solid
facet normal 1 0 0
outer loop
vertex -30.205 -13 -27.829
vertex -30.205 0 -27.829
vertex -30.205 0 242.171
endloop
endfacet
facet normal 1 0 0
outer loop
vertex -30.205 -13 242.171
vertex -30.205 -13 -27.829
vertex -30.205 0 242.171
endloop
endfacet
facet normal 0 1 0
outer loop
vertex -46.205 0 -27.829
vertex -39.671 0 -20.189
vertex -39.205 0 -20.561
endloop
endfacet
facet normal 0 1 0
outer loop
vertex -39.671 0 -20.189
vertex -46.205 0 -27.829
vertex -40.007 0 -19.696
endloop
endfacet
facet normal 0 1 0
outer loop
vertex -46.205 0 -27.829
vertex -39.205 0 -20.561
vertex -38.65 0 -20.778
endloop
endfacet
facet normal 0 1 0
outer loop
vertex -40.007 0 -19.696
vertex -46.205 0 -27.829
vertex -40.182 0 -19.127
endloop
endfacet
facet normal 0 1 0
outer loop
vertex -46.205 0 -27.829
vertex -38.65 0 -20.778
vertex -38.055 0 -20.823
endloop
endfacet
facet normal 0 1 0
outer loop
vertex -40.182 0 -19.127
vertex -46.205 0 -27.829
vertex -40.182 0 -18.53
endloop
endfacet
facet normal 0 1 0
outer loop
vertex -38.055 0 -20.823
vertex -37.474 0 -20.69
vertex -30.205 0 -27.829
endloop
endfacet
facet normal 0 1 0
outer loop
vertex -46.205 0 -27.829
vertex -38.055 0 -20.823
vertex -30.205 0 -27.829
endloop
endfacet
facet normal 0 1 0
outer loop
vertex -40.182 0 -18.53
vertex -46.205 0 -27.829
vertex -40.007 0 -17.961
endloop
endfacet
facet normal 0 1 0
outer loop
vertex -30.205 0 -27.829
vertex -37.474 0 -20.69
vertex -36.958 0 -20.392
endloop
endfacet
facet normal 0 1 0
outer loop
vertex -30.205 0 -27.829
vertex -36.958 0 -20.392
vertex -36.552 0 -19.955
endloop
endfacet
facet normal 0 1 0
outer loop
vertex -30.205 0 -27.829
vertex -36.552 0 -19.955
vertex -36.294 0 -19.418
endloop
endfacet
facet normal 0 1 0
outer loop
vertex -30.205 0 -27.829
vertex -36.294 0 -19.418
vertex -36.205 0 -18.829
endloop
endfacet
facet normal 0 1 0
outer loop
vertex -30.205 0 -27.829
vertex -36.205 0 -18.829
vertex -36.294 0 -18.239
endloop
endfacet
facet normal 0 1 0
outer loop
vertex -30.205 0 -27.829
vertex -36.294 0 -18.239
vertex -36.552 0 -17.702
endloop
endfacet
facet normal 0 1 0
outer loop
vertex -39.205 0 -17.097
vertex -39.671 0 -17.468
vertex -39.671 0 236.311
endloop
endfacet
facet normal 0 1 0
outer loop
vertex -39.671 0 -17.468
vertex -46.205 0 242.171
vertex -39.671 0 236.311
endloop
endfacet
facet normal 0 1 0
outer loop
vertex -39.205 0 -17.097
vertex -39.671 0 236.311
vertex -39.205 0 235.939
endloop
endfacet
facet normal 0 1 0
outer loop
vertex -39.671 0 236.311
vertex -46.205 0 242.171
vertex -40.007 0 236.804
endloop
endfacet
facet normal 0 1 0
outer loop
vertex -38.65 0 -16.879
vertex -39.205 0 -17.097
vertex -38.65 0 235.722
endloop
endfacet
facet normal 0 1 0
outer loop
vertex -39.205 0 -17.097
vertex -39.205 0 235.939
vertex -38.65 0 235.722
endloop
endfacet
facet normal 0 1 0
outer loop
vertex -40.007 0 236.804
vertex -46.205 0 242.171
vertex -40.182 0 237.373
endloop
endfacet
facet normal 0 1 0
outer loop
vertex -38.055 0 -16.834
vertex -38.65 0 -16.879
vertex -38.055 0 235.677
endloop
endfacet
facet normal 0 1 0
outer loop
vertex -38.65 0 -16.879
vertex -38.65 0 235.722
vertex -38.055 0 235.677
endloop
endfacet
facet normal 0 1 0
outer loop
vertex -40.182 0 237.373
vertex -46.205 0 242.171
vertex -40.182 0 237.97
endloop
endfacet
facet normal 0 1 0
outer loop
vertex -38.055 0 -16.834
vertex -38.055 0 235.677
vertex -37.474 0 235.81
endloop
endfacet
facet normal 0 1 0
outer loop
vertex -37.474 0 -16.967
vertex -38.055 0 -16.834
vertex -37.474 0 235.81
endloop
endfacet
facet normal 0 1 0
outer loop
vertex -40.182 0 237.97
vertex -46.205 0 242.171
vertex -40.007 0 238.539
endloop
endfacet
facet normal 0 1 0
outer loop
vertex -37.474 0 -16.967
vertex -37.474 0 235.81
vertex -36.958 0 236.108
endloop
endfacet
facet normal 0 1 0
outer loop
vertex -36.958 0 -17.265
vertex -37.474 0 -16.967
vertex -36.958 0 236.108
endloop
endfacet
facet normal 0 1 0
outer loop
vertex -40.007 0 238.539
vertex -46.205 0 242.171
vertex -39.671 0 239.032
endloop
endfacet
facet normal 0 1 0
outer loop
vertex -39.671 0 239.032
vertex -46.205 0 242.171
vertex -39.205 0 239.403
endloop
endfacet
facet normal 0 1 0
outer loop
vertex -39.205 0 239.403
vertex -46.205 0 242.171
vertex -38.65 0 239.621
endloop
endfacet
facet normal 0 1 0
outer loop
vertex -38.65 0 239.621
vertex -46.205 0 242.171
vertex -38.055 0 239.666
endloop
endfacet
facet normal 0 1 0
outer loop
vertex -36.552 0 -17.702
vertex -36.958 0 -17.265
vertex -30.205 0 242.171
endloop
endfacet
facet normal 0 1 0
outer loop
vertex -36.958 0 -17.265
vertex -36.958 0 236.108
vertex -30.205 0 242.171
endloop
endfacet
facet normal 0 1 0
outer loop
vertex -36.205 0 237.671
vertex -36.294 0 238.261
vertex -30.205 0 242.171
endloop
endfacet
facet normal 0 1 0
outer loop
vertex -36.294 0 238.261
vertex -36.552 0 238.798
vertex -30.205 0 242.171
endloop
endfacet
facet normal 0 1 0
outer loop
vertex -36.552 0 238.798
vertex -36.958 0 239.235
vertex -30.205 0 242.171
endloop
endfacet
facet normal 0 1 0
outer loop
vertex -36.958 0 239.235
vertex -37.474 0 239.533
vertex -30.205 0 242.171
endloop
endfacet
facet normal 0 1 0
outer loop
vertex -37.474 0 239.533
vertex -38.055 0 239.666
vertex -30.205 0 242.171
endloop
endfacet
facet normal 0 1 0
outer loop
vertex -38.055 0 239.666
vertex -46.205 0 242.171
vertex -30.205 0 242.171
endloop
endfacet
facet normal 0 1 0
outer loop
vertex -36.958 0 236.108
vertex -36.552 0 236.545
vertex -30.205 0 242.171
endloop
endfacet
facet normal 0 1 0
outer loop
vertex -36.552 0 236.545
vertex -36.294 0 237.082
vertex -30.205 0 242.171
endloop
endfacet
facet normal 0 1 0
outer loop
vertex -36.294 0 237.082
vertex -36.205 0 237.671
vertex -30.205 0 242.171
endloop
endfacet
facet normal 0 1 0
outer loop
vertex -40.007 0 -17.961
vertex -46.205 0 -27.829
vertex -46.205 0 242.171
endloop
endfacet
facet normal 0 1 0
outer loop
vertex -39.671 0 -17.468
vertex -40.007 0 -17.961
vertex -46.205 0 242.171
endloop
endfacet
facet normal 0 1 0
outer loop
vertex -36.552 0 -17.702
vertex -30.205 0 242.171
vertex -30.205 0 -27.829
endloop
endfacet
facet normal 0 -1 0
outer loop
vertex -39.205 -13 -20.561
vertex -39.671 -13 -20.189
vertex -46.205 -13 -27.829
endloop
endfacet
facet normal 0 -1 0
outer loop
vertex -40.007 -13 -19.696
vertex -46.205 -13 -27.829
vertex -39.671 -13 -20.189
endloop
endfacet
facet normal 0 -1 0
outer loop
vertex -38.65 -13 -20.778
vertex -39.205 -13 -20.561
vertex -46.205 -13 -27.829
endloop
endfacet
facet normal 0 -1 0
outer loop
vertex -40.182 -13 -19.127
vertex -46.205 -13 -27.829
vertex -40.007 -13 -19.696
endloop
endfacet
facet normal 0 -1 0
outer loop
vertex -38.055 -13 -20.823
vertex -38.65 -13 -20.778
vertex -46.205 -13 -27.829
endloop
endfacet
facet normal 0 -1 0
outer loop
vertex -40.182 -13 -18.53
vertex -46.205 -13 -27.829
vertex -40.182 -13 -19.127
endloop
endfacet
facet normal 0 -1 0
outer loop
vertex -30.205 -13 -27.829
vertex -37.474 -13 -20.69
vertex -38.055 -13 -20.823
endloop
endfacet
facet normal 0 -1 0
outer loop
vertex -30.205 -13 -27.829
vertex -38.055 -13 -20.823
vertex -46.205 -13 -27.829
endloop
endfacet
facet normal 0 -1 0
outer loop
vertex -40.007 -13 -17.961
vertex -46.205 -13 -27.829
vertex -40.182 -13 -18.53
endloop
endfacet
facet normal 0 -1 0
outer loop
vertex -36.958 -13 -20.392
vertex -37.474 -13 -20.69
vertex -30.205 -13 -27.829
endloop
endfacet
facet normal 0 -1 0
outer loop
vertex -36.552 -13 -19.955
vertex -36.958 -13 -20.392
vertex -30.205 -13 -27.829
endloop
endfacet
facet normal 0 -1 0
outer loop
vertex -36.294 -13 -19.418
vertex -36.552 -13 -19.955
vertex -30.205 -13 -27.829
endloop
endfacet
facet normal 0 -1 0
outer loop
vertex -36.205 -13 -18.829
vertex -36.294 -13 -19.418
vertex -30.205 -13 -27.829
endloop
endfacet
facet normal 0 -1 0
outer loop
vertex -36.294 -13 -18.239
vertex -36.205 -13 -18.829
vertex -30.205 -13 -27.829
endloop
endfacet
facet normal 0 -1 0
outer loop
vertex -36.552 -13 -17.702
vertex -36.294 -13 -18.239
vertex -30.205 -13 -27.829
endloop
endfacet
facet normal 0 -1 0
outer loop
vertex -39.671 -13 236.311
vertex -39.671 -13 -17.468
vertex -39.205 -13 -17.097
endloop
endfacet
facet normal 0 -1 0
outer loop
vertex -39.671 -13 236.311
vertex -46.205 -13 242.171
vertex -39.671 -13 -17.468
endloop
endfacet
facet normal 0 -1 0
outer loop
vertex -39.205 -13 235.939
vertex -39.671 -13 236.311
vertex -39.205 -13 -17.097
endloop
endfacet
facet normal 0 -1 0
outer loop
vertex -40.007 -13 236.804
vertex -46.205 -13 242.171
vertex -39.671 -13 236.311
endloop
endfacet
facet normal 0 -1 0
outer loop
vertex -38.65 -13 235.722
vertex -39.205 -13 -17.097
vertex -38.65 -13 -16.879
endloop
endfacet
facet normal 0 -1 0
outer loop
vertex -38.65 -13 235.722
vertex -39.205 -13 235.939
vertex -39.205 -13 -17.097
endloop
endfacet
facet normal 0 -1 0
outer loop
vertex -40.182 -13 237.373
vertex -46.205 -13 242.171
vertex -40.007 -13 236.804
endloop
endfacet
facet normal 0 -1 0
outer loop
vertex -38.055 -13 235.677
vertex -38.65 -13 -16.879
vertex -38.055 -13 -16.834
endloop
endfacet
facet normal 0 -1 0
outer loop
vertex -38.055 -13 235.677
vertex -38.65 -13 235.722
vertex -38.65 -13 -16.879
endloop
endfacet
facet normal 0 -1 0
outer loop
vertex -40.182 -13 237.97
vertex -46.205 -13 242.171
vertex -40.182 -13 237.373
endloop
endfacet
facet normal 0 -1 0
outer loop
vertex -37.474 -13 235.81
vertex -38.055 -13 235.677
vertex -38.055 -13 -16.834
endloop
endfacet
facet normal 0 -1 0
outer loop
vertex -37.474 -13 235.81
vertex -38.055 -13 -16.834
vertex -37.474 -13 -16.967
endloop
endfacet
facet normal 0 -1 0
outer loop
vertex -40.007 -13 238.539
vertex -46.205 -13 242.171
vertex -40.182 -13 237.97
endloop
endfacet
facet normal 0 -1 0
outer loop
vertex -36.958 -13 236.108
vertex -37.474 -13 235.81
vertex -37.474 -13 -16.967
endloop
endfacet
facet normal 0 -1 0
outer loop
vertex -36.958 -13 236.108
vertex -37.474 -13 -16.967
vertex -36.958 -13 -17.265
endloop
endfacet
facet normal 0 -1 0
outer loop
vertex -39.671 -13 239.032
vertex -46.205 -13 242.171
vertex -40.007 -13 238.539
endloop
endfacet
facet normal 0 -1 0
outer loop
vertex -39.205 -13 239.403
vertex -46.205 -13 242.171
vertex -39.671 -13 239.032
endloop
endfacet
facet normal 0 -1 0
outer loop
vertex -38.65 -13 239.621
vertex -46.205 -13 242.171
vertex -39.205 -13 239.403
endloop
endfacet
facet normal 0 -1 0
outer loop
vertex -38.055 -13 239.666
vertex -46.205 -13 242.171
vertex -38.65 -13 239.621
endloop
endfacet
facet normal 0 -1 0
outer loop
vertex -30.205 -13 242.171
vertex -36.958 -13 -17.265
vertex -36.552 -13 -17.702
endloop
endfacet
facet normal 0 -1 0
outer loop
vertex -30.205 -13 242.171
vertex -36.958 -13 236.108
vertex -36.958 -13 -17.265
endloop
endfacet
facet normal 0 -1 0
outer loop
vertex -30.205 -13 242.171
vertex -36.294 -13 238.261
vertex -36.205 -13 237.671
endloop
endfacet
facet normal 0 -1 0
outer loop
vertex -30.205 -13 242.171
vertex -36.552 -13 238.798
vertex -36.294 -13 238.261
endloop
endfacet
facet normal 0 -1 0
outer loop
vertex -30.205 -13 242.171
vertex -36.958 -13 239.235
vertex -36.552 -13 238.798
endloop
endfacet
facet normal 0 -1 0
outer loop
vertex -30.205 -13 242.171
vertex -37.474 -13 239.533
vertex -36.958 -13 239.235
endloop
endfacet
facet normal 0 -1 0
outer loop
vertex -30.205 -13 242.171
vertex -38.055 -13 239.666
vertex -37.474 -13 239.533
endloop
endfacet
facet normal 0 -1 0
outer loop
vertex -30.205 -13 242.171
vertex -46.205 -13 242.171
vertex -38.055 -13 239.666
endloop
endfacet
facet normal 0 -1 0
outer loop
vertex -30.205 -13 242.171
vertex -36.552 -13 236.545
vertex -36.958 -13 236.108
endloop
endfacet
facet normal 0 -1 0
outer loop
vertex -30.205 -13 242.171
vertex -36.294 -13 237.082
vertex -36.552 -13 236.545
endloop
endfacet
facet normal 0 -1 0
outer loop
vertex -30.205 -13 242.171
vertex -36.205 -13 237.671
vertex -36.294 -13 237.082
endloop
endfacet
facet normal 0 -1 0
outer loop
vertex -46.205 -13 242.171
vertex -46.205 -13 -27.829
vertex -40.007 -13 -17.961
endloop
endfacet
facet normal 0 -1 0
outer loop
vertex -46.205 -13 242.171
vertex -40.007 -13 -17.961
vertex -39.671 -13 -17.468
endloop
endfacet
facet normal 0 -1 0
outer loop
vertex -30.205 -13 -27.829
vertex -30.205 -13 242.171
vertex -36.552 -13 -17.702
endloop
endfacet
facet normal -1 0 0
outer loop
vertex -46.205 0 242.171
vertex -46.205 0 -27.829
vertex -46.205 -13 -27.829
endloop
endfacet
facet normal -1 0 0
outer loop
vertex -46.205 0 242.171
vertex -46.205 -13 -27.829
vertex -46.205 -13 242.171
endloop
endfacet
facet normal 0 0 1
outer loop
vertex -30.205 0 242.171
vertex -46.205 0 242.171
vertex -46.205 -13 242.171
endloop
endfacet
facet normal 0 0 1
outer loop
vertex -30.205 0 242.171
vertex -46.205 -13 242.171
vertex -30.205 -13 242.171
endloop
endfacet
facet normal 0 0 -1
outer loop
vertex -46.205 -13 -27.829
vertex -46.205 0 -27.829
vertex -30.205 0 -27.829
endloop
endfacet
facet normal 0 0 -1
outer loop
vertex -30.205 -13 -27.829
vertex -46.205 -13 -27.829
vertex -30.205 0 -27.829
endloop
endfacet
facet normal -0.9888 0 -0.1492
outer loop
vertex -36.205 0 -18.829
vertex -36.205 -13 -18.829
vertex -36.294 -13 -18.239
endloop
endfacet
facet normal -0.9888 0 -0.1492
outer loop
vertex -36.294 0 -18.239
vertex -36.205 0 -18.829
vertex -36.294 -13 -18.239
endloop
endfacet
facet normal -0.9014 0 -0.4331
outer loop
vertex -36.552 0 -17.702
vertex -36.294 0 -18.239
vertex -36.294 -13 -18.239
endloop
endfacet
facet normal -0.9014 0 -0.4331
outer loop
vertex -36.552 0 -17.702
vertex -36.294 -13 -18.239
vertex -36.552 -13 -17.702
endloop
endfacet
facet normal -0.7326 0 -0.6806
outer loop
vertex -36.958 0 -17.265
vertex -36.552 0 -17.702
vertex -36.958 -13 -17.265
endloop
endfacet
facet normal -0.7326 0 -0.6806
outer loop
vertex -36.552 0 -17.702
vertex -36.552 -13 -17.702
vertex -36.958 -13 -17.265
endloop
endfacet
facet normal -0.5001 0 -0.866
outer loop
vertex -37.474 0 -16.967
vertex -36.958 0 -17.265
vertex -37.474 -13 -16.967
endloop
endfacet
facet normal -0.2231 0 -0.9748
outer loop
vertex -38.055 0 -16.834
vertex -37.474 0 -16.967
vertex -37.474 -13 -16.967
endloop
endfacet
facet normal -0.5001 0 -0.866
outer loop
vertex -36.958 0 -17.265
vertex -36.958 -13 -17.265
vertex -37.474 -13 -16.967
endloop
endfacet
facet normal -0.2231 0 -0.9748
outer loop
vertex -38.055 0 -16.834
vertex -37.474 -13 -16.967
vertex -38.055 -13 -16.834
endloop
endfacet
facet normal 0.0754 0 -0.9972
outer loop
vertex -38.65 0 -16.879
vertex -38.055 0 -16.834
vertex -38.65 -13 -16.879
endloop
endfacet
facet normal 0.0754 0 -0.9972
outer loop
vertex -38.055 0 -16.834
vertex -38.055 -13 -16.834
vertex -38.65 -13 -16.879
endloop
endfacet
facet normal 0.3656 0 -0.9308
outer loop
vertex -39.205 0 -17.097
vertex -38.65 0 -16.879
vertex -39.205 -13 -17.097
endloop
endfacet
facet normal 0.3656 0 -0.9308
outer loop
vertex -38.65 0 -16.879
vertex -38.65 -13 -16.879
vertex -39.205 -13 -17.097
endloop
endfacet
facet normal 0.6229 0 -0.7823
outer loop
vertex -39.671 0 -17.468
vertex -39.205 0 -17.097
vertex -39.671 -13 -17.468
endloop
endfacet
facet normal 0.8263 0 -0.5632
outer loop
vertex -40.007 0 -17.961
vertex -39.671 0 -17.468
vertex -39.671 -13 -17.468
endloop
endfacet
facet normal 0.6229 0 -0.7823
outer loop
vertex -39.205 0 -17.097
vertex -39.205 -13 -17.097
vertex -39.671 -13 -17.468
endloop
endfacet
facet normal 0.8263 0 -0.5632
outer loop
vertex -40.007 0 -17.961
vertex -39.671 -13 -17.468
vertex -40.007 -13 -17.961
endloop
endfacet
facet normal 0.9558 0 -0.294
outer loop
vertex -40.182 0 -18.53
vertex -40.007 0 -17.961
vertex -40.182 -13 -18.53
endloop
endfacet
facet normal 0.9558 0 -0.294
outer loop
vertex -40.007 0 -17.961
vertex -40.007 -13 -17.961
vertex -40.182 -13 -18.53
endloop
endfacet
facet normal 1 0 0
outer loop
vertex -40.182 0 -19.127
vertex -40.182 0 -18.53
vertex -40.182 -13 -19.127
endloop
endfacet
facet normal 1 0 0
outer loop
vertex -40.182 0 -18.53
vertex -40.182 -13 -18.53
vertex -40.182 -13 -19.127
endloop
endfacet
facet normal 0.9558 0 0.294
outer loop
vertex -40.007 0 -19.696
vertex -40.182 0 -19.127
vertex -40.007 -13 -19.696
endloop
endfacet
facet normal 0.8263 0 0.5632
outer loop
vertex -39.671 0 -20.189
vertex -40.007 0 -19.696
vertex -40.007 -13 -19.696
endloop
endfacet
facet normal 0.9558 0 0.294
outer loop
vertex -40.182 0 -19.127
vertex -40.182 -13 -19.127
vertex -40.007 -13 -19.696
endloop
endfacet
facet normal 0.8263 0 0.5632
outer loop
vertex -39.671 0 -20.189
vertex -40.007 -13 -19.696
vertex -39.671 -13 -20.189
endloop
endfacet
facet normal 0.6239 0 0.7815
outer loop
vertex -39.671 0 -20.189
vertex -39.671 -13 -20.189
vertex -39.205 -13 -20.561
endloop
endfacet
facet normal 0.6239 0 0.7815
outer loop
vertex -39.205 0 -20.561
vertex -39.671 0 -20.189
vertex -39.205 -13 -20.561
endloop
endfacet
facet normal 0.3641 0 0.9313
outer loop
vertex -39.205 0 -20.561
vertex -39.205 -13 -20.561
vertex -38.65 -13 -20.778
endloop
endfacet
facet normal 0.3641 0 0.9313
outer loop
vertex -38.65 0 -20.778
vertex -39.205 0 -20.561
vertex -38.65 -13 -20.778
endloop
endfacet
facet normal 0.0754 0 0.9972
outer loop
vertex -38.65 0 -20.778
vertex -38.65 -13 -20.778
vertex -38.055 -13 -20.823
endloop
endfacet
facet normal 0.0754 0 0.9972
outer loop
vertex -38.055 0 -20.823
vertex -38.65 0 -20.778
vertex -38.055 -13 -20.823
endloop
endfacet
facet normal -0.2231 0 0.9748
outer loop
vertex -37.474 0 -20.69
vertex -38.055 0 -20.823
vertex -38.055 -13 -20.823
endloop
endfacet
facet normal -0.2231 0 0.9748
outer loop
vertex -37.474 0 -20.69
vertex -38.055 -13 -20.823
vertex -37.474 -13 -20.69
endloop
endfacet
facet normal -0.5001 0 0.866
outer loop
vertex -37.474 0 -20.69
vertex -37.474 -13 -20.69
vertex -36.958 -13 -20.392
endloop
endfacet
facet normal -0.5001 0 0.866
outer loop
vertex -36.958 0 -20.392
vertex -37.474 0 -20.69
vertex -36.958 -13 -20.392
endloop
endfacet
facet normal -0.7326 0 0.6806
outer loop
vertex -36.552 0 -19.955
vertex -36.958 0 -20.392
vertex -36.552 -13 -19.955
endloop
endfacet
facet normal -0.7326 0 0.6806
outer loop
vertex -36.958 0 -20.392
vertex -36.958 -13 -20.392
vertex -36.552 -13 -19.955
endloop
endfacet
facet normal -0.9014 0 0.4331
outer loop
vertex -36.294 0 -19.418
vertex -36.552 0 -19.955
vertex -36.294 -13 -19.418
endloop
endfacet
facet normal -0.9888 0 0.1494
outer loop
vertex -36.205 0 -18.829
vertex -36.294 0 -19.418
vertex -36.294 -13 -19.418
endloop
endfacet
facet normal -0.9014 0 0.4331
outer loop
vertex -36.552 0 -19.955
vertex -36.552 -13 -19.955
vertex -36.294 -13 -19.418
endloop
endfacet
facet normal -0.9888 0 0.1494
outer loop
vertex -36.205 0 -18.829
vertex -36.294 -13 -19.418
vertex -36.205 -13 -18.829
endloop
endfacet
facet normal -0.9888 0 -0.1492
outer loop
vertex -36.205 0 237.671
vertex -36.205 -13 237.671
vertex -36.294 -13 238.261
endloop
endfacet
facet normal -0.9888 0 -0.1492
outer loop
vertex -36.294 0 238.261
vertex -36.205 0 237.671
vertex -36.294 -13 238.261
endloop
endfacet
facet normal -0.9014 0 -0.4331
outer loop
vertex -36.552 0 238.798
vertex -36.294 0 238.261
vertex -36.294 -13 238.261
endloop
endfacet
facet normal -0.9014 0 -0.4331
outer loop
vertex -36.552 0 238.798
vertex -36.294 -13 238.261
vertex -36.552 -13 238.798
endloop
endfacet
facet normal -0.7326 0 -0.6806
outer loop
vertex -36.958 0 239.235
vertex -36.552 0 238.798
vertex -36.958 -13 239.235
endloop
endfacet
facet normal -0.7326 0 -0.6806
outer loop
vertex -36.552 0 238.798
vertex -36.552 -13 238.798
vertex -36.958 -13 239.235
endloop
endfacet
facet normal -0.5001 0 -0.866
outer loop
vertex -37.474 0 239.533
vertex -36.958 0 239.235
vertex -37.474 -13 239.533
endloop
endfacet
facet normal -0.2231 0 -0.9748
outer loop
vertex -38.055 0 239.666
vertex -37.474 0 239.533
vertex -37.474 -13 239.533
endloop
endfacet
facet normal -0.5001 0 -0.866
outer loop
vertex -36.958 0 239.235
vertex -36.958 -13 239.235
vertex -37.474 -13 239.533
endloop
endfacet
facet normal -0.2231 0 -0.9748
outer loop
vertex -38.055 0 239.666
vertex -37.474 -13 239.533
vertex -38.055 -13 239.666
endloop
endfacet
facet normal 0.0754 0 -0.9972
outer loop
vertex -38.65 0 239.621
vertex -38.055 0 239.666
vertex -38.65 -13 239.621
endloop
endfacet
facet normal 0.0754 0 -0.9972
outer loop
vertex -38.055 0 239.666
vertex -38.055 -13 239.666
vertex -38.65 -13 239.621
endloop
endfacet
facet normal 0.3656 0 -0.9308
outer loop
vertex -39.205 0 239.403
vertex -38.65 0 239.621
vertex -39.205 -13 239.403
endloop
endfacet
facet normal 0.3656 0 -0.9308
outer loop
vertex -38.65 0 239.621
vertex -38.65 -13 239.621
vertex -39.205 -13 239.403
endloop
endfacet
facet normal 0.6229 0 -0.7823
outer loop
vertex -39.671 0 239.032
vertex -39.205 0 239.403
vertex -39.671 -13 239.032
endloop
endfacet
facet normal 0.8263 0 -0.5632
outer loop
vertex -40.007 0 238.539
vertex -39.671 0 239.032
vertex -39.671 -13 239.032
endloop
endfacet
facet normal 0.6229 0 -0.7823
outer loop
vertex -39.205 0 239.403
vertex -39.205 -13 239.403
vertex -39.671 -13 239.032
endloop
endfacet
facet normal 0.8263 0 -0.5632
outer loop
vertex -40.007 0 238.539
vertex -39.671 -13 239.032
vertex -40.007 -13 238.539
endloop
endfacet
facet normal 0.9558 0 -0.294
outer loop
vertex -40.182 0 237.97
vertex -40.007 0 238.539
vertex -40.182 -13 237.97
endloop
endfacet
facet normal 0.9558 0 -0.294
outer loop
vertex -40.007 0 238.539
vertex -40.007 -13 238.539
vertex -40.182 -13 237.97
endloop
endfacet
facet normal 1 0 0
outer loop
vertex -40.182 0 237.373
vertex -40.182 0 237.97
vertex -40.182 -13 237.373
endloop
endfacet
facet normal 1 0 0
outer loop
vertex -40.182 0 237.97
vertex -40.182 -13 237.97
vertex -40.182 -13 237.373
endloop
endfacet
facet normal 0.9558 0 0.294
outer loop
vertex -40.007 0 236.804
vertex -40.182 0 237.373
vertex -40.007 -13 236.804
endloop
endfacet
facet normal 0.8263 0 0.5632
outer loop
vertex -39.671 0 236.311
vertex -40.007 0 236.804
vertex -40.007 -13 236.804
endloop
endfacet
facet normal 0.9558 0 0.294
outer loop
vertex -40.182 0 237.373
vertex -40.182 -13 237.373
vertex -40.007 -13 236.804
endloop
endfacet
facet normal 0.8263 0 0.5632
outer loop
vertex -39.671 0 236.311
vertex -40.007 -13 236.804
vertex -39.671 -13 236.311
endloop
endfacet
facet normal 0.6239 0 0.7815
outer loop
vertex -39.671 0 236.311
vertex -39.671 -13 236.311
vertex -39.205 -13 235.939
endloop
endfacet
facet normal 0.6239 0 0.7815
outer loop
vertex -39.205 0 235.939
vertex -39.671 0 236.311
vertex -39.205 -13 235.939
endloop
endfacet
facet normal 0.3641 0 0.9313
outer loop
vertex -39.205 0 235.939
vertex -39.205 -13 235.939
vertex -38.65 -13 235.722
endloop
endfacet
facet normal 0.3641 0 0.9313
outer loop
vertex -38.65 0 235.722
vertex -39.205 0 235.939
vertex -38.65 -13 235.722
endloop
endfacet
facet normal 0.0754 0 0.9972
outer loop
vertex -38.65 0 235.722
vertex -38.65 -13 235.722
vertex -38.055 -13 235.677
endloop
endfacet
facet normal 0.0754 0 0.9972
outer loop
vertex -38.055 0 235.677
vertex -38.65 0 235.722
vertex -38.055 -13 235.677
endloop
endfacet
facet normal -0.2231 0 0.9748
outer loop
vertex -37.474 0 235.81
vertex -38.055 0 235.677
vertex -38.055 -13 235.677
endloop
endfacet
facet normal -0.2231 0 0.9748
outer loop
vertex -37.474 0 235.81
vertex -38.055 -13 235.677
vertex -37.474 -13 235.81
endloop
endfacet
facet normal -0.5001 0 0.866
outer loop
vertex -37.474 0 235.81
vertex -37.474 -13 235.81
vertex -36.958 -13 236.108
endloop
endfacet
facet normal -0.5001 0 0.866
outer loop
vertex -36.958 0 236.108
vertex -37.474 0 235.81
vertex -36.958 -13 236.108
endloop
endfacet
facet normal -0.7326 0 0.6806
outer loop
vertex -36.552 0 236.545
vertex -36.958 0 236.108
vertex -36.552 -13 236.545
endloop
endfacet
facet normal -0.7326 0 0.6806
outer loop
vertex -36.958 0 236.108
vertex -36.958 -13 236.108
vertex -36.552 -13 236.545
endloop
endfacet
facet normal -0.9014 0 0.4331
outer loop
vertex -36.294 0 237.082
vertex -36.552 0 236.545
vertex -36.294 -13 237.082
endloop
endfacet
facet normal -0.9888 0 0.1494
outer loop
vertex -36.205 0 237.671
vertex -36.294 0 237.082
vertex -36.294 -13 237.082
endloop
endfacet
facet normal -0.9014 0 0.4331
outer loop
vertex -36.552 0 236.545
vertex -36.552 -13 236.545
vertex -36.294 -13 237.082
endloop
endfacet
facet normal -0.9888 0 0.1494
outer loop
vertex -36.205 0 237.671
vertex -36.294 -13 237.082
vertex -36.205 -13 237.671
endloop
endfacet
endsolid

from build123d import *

# Parameters (mm, degrees)
F0_W     = 16
F0_H     = 270
F1_DEPTH = 13
F2_R     = 2
F3_DEPTH = 13
F5_DEPTH = 13


with BuildPart() as f1:
    # F0 (on Front) → F1 (new body)
    with BuildSketch(Plane.XZ):
        with Locations((-38.204761, 107.17144)):
            Rectangle(F0_W, F0_H)
    extrude(amount=F1_DEPTH)

    # F2 (on face) → F3 (cut)
    with BuildSketch(Plane.XZ.offset(13)):
        with Locations((-38.204761, -18.82856)):
            Circle(F2_R)
    extrude(amount=-F3_DEPTH, mode=Mode.SUBTRACT)

    # F4 (on face) → F5 (cut)
    with BuildSketch(Plane.XZ.offset(13)):
        with BuildLine():
            ThreePointArc((-40.204761, 237.67144), (-38.204761, 235.67144), (-36.204761, 237.67144))
            ThreePointArc((-36.204761, 237.67144), (-38.204761, 239.67144), (-40.204761, 237.67144))
        make_face()
    extrude(amount=-F5_DEPTH, mode=Mode.SUBTRACT)


solid = f1.part
